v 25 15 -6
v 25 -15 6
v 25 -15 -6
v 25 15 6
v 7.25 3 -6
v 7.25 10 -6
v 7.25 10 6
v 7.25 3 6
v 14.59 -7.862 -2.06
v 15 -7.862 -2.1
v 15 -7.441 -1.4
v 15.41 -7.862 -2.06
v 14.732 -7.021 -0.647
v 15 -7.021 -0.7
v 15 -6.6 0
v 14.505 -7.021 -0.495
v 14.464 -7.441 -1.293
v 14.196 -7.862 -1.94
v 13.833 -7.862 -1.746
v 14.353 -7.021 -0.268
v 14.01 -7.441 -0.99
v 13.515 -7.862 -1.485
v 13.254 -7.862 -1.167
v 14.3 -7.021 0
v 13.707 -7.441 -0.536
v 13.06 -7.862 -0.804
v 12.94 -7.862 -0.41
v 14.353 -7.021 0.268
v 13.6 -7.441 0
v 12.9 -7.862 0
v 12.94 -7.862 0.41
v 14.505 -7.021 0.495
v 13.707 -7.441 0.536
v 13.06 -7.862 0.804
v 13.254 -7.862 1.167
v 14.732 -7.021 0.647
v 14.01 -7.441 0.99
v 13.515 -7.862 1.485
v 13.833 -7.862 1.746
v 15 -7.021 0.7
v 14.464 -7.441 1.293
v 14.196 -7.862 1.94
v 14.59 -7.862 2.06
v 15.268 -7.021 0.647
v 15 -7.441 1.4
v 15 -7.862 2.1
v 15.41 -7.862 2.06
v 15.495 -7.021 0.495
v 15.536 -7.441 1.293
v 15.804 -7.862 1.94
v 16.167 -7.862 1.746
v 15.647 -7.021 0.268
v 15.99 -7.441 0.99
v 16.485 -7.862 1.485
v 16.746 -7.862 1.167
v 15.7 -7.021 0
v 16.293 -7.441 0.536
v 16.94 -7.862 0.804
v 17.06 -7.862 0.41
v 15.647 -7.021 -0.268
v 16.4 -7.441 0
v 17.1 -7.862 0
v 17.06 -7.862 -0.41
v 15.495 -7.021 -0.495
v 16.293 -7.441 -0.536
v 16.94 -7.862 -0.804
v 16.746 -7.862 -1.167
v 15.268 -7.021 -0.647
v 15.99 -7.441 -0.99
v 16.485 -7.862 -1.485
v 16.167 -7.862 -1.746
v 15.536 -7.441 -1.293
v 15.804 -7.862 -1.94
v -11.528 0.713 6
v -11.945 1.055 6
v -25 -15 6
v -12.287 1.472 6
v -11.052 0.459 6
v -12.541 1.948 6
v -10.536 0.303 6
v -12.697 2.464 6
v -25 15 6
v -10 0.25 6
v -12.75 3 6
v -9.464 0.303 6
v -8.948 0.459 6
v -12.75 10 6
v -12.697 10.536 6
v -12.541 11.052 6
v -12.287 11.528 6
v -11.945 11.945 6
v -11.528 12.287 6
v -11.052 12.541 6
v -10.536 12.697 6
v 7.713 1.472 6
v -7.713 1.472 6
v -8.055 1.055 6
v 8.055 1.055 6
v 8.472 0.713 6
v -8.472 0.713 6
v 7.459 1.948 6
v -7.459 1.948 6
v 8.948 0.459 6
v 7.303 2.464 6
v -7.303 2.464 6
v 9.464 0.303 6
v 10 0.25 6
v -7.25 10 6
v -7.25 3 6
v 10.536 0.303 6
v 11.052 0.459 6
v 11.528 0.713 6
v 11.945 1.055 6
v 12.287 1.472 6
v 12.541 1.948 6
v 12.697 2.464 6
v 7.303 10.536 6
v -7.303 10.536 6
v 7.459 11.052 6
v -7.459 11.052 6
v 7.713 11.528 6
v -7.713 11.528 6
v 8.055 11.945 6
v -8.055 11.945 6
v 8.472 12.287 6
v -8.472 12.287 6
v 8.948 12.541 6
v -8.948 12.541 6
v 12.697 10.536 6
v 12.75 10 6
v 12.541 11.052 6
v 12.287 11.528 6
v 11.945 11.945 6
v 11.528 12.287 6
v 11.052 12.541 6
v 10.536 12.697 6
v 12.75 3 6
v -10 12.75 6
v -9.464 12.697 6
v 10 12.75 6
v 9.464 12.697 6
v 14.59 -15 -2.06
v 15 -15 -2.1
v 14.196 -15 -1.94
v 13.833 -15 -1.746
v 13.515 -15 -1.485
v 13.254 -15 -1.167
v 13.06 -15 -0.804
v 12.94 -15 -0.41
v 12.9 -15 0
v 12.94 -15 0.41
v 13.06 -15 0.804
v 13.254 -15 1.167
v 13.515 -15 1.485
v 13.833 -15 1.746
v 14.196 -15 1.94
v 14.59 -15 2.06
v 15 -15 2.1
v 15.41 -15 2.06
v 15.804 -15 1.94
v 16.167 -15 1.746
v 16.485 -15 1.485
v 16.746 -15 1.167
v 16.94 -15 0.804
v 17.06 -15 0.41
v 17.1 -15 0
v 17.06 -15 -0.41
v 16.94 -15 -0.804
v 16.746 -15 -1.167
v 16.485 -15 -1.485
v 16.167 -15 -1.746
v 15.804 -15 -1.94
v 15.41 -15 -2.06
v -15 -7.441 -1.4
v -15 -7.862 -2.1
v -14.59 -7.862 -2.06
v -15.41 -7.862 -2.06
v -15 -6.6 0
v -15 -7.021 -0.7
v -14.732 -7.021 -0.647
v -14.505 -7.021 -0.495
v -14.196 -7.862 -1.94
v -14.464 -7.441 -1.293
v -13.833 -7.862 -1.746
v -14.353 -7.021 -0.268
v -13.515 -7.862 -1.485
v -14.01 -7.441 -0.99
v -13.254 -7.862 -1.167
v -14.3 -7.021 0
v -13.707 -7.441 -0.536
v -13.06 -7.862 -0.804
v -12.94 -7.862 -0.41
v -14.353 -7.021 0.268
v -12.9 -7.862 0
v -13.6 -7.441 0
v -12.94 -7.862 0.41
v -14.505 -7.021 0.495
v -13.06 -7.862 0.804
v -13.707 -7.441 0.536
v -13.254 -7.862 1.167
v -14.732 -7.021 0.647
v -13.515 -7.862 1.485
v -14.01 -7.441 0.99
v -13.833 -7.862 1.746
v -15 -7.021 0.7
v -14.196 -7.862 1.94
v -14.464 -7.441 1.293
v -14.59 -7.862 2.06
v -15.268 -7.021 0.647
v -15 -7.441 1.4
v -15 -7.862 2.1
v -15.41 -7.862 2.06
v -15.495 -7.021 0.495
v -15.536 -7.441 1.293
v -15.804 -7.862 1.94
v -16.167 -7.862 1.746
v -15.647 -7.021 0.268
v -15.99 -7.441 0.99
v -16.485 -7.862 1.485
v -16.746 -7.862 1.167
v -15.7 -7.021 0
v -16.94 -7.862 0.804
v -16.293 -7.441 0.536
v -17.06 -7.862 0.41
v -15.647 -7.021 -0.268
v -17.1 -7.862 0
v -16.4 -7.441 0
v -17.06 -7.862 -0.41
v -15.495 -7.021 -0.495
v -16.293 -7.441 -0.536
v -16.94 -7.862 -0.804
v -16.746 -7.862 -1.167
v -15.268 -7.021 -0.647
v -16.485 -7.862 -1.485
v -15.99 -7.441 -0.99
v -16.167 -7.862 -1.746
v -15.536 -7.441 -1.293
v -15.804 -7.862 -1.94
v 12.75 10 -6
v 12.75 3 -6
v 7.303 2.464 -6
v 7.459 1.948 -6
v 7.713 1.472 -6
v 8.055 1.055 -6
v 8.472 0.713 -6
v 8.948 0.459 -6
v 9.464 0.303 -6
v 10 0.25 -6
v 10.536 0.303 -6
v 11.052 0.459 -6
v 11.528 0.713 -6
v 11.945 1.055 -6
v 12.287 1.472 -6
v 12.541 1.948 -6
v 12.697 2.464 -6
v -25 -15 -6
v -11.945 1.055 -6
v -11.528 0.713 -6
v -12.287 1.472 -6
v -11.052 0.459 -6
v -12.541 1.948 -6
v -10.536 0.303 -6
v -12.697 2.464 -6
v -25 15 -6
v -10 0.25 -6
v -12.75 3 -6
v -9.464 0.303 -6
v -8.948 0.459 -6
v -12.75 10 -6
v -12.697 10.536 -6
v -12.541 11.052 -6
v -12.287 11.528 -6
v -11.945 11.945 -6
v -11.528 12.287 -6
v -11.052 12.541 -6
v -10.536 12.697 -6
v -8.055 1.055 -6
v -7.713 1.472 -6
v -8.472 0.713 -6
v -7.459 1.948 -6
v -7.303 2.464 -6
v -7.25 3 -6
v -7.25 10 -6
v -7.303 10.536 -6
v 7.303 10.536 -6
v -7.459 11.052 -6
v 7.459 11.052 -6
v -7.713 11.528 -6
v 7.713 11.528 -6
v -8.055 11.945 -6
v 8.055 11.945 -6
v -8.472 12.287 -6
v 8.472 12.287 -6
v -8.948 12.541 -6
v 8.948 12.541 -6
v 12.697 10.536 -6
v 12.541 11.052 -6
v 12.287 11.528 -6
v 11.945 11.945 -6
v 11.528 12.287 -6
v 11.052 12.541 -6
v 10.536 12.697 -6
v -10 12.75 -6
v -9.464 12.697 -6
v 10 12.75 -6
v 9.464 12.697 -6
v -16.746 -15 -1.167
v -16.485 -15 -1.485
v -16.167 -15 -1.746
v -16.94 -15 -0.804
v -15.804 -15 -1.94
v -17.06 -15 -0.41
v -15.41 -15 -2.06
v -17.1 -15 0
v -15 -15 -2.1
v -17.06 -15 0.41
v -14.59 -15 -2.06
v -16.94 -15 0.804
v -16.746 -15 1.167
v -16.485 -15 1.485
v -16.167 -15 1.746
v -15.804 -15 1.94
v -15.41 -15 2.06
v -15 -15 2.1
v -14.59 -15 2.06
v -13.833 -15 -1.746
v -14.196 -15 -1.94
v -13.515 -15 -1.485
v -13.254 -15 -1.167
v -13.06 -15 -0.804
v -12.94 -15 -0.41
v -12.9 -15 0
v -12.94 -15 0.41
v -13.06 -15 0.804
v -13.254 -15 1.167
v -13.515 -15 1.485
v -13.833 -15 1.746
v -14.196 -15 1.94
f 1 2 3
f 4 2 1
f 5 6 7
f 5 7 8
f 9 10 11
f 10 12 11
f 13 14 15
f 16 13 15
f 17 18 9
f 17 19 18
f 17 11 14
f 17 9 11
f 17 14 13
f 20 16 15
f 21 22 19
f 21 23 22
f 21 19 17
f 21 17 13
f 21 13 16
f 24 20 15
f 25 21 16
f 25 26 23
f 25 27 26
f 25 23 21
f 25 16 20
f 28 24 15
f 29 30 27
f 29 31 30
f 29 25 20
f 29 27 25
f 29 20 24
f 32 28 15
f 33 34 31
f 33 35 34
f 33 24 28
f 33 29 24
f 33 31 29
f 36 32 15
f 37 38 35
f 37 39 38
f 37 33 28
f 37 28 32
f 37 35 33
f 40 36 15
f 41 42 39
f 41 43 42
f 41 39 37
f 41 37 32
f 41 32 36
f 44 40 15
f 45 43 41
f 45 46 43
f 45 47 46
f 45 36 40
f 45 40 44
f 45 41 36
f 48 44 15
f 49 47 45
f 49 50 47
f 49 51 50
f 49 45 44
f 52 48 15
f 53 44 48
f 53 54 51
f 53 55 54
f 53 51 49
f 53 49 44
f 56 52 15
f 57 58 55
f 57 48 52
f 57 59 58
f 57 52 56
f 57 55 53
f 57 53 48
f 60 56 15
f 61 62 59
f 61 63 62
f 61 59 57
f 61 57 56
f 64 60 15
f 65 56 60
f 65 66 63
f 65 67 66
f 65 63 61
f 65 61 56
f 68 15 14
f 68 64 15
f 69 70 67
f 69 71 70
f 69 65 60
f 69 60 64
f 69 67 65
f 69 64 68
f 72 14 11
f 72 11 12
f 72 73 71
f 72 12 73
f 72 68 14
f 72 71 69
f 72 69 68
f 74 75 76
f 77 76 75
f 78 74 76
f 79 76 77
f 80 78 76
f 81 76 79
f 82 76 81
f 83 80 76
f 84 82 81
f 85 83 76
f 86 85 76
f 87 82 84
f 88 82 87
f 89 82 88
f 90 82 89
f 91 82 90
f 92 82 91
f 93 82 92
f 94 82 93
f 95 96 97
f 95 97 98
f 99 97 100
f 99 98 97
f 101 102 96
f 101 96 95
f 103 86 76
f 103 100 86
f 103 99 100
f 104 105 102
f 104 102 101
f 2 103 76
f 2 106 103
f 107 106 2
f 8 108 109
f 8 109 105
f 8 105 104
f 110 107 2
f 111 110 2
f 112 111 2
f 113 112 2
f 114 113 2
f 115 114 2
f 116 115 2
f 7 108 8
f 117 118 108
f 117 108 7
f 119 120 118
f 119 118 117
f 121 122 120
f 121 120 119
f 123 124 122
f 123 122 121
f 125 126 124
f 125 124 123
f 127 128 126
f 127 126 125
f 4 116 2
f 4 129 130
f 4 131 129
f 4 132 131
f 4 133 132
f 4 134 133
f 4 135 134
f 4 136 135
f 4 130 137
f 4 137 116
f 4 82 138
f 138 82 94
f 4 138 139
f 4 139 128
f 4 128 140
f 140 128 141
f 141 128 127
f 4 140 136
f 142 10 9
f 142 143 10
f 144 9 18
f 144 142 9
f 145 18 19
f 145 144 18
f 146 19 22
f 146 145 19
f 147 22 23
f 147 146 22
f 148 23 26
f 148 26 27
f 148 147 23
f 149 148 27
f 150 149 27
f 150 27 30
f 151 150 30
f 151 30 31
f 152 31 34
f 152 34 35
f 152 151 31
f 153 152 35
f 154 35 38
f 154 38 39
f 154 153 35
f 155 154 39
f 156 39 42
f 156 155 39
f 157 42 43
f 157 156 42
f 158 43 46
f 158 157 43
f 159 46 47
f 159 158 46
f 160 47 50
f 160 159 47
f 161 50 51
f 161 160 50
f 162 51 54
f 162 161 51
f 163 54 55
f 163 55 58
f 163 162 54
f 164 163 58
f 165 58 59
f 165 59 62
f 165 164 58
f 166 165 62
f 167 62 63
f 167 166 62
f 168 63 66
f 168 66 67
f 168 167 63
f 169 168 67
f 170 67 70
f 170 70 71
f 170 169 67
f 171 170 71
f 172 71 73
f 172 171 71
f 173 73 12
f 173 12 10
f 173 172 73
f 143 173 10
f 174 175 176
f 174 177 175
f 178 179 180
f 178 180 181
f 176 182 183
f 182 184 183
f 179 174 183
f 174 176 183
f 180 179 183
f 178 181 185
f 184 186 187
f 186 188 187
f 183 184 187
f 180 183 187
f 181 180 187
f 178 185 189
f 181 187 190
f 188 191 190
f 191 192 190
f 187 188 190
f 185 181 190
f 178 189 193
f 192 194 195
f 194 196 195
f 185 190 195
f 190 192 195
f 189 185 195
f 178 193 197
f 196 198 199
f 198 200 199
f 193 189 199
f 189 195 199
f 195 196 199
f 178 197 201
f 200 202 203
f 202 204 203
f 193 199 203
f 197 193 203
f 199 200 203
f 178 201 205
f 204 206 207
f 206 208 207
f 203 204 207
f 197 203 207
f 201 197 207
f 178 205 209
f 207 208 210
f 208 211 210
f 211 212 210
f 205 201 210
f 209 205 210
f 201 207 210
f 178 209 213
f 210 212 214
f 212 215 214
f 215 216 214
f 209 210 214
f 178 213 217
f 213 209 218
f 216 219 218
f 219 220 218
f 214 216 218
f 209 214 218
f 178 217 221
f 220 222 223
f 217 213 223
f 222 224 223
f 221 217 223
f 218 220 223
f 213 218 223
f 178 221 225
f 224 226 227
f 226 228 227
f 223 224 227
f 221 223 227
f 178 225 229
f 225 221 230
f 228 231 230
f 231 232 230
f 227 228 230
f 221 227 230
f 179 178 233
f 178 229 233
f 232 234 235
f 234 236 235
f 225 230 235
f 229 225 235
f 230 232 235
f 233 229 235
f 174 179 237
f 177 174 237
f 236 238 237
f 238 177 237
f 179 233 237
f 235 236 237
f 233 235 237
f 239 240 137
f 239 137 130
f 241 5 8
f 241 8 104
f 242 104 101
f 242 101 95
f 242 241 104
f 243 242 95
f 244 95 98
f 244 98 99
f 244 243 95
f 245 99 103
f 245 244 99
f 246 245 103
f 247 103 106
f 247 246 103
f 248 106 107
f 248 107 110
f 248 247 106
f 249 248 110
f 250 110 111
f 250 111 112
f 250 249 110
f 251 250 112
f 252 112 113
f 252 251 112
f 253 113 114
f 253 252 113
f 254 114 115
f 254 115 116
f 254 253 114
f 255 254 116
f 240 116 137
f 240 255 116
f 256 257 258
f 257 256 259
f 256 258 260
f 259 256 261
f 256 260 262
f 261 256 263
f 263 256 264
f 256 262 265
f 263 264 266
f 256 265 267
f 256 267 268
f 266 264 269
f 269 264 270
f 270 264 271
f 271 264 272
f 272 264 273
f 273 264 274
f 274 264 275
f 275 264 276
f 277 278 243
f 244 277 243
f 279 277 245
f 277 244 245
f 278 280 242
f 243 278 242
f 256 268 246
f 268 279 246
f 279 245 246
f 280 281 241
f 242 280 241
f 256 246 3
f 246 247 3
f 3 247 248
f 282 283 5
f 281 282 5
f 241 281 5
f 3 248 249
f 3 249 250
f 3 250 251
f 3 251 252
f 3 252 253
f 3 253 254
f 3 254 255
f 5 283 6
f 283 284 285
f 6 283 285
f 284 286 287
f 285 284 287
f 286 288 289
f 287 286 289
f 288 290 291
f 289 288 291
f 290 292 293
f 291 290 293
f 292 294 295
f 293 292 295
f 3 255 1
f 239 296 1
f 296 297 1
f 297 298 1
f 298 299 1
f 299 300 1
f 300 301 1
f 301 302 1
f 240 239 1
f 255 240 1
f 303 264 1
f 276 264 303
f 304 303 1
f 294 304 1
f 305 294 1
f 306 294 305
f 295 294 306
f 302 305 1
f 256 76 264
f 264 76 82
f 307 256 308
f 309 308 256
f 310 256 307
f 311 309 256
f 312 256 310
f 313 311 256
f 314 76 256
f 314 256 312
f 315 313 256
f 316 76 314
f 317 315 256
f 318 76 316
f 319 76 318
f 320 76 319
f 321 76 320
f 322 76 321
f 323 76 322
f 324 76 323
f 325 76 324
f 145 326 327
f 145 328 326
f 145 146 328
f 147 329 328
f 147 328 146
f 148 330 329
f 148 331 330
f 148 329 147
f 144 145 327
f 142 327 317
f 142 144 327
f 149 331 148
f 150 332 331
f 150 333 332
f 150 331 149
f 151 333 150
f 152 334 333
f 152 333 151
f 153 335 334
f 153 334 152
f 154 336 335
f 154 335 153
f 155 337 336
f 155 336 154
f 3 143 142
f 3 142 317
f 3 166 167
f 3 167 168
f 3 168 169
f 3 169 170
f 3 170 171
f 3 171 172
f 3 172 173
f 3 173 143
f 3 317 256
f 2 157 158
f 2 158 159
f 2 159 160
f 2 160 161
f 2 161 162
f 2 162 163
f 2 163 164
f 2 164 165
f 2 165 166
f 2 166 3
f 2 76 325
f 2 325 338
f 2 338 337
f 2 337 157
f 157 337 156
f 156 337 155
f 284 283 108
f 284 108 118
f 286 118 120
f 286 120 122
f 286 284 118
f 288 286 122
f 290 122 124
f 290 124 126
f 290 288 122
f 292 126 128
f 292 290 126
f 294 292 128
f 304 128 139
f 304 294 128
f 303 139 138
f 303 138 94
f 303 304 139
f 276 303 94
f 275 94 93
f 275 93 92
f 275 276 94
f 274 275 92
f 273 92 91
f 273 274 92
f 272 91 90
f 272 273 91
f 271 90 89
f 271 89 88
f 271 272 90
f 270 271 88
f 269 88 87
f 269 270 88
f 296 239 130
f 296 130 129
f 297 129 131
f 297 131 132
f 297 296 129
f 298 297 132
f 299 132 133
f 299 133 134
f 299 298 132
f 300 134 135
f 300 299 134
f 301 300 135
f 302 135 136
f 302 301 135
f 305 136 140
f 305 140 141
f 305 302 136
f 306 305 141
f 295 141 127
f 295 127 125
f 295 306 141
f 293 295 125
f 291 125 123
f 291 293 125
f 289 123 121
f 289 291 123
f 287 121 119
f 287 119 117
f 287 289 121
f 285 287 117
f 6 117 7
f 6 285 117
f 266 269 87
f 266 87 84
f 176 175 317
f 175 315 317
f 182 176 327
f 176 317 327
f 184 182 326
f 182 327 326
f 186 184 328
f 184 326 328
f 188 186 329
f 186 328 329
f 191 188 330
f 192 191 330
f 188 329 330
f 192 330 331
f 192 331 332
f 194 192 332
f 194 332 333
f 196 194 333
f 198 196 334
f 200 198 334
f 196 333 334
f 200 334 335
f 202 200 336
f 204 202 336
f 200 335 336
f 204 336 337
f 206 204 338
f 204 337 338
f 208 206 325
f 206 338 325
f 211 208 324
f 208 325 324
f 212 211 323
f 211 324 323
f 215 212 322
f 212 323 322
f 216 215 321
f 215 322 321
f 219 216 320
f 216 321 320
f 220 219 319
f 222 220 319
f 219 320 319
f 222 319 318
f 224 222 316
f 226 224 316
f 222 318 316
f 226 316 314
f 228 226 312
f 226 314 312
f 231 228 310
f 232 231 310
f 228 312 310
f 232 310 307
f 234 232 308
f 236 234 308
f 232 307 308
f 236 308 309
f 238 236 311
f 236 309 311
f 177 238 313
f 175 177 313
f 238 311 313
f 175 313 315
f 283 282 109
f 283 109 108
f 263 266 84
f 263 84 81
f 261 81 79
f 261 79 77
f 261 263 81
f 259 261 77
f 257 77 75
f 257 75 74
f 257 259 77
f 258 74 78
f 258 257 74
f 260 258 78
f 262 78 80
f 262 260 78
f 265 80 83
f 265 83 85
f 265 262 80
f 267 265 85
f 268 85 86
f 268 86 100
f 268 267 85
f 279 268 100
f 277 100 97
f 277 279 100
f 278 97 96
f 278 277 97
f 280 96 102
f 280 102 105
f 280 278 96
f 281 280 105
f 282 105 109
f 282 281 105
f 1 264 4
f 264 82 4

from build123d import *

# Parameters (mm, degrees)
SKETCH1_W                = 50
SKETCH1_H                = 30
BOSS_EXTRUDE1_DEPTH      = 6
M5_START                 = -6
M5_CLEARANCE_SLOT1_DEPTH = 12


# Read off the part's stored shape, not the designer's step: M5 Clearance Slot1
with BuildPart() as part:
    # Sketch1 → Boss-Extrude1 (new, symmetric)
    with BuildSketch(Plane.XY):
        Rectangle(SKETCH1_W, SKETCH1_H)
    extrude(amount=BOSS_EXTRUDE1_DEPTH, both=True)

    # M5 Clearance Slot1 outline → M5 Clearance Slot1 (cut)
    with BuildSketch(Plane.XY.offset(M5_START)):
        with BuildLine():
            Line((7.25, 10), (7.25, 3))
            ThreePointArc((7.25, 3), (10, 0.25), (12.75, 3))
            Line((12.75, 3), (12.75, 10))
            ThreePointArc((12.75, 10), (10, 12.75), (7.25, 10))
        make_face()
        with BuildLine():
            Line((-12.75, 10), (-12.75, 3))
            ThreePointArc((-12.75, 3), (-10, 0.25), (-7.25, 3))
            Line((-7.25, 3), (-7.25, 10))
            ThreePointArc((-7.25, 10), (-10, 12.75), (-12.75, 10))
        make_face()
    extrude(amount=M5_CLEARANCE_SLOT1_DEPTH, mode=Mode.SUBTRACT)

    # Sketch5 → M5x0.8 Tapped Hole1 (revolve, cut)
    with BuildSketch(Plane(origin=(15, -15, 0), x_dir=(0, 0, -1), z_dir=(1, 0, 0))):
        Polygon((0, 0), (0, 8.4), (2.1, 7.1381927), (2.1, 0), align=None)
    m5x0_8_tapped_hole1 = revolve(axis=Axis((15, -21.35, 0), (0, 1, 0)), mode=Mode.SUBTRACT)

    # Mirror1: M5x0.8 Tapped Hole1 across plane
    add(m5x0_8_tapped_hole1.mirror(Plane(origin=(0, 0, 0), x_dir=(0, 0, 1), z_dir=(1, 0, 0))), mode=Mode.SUBTRACT)


solid = part.part
